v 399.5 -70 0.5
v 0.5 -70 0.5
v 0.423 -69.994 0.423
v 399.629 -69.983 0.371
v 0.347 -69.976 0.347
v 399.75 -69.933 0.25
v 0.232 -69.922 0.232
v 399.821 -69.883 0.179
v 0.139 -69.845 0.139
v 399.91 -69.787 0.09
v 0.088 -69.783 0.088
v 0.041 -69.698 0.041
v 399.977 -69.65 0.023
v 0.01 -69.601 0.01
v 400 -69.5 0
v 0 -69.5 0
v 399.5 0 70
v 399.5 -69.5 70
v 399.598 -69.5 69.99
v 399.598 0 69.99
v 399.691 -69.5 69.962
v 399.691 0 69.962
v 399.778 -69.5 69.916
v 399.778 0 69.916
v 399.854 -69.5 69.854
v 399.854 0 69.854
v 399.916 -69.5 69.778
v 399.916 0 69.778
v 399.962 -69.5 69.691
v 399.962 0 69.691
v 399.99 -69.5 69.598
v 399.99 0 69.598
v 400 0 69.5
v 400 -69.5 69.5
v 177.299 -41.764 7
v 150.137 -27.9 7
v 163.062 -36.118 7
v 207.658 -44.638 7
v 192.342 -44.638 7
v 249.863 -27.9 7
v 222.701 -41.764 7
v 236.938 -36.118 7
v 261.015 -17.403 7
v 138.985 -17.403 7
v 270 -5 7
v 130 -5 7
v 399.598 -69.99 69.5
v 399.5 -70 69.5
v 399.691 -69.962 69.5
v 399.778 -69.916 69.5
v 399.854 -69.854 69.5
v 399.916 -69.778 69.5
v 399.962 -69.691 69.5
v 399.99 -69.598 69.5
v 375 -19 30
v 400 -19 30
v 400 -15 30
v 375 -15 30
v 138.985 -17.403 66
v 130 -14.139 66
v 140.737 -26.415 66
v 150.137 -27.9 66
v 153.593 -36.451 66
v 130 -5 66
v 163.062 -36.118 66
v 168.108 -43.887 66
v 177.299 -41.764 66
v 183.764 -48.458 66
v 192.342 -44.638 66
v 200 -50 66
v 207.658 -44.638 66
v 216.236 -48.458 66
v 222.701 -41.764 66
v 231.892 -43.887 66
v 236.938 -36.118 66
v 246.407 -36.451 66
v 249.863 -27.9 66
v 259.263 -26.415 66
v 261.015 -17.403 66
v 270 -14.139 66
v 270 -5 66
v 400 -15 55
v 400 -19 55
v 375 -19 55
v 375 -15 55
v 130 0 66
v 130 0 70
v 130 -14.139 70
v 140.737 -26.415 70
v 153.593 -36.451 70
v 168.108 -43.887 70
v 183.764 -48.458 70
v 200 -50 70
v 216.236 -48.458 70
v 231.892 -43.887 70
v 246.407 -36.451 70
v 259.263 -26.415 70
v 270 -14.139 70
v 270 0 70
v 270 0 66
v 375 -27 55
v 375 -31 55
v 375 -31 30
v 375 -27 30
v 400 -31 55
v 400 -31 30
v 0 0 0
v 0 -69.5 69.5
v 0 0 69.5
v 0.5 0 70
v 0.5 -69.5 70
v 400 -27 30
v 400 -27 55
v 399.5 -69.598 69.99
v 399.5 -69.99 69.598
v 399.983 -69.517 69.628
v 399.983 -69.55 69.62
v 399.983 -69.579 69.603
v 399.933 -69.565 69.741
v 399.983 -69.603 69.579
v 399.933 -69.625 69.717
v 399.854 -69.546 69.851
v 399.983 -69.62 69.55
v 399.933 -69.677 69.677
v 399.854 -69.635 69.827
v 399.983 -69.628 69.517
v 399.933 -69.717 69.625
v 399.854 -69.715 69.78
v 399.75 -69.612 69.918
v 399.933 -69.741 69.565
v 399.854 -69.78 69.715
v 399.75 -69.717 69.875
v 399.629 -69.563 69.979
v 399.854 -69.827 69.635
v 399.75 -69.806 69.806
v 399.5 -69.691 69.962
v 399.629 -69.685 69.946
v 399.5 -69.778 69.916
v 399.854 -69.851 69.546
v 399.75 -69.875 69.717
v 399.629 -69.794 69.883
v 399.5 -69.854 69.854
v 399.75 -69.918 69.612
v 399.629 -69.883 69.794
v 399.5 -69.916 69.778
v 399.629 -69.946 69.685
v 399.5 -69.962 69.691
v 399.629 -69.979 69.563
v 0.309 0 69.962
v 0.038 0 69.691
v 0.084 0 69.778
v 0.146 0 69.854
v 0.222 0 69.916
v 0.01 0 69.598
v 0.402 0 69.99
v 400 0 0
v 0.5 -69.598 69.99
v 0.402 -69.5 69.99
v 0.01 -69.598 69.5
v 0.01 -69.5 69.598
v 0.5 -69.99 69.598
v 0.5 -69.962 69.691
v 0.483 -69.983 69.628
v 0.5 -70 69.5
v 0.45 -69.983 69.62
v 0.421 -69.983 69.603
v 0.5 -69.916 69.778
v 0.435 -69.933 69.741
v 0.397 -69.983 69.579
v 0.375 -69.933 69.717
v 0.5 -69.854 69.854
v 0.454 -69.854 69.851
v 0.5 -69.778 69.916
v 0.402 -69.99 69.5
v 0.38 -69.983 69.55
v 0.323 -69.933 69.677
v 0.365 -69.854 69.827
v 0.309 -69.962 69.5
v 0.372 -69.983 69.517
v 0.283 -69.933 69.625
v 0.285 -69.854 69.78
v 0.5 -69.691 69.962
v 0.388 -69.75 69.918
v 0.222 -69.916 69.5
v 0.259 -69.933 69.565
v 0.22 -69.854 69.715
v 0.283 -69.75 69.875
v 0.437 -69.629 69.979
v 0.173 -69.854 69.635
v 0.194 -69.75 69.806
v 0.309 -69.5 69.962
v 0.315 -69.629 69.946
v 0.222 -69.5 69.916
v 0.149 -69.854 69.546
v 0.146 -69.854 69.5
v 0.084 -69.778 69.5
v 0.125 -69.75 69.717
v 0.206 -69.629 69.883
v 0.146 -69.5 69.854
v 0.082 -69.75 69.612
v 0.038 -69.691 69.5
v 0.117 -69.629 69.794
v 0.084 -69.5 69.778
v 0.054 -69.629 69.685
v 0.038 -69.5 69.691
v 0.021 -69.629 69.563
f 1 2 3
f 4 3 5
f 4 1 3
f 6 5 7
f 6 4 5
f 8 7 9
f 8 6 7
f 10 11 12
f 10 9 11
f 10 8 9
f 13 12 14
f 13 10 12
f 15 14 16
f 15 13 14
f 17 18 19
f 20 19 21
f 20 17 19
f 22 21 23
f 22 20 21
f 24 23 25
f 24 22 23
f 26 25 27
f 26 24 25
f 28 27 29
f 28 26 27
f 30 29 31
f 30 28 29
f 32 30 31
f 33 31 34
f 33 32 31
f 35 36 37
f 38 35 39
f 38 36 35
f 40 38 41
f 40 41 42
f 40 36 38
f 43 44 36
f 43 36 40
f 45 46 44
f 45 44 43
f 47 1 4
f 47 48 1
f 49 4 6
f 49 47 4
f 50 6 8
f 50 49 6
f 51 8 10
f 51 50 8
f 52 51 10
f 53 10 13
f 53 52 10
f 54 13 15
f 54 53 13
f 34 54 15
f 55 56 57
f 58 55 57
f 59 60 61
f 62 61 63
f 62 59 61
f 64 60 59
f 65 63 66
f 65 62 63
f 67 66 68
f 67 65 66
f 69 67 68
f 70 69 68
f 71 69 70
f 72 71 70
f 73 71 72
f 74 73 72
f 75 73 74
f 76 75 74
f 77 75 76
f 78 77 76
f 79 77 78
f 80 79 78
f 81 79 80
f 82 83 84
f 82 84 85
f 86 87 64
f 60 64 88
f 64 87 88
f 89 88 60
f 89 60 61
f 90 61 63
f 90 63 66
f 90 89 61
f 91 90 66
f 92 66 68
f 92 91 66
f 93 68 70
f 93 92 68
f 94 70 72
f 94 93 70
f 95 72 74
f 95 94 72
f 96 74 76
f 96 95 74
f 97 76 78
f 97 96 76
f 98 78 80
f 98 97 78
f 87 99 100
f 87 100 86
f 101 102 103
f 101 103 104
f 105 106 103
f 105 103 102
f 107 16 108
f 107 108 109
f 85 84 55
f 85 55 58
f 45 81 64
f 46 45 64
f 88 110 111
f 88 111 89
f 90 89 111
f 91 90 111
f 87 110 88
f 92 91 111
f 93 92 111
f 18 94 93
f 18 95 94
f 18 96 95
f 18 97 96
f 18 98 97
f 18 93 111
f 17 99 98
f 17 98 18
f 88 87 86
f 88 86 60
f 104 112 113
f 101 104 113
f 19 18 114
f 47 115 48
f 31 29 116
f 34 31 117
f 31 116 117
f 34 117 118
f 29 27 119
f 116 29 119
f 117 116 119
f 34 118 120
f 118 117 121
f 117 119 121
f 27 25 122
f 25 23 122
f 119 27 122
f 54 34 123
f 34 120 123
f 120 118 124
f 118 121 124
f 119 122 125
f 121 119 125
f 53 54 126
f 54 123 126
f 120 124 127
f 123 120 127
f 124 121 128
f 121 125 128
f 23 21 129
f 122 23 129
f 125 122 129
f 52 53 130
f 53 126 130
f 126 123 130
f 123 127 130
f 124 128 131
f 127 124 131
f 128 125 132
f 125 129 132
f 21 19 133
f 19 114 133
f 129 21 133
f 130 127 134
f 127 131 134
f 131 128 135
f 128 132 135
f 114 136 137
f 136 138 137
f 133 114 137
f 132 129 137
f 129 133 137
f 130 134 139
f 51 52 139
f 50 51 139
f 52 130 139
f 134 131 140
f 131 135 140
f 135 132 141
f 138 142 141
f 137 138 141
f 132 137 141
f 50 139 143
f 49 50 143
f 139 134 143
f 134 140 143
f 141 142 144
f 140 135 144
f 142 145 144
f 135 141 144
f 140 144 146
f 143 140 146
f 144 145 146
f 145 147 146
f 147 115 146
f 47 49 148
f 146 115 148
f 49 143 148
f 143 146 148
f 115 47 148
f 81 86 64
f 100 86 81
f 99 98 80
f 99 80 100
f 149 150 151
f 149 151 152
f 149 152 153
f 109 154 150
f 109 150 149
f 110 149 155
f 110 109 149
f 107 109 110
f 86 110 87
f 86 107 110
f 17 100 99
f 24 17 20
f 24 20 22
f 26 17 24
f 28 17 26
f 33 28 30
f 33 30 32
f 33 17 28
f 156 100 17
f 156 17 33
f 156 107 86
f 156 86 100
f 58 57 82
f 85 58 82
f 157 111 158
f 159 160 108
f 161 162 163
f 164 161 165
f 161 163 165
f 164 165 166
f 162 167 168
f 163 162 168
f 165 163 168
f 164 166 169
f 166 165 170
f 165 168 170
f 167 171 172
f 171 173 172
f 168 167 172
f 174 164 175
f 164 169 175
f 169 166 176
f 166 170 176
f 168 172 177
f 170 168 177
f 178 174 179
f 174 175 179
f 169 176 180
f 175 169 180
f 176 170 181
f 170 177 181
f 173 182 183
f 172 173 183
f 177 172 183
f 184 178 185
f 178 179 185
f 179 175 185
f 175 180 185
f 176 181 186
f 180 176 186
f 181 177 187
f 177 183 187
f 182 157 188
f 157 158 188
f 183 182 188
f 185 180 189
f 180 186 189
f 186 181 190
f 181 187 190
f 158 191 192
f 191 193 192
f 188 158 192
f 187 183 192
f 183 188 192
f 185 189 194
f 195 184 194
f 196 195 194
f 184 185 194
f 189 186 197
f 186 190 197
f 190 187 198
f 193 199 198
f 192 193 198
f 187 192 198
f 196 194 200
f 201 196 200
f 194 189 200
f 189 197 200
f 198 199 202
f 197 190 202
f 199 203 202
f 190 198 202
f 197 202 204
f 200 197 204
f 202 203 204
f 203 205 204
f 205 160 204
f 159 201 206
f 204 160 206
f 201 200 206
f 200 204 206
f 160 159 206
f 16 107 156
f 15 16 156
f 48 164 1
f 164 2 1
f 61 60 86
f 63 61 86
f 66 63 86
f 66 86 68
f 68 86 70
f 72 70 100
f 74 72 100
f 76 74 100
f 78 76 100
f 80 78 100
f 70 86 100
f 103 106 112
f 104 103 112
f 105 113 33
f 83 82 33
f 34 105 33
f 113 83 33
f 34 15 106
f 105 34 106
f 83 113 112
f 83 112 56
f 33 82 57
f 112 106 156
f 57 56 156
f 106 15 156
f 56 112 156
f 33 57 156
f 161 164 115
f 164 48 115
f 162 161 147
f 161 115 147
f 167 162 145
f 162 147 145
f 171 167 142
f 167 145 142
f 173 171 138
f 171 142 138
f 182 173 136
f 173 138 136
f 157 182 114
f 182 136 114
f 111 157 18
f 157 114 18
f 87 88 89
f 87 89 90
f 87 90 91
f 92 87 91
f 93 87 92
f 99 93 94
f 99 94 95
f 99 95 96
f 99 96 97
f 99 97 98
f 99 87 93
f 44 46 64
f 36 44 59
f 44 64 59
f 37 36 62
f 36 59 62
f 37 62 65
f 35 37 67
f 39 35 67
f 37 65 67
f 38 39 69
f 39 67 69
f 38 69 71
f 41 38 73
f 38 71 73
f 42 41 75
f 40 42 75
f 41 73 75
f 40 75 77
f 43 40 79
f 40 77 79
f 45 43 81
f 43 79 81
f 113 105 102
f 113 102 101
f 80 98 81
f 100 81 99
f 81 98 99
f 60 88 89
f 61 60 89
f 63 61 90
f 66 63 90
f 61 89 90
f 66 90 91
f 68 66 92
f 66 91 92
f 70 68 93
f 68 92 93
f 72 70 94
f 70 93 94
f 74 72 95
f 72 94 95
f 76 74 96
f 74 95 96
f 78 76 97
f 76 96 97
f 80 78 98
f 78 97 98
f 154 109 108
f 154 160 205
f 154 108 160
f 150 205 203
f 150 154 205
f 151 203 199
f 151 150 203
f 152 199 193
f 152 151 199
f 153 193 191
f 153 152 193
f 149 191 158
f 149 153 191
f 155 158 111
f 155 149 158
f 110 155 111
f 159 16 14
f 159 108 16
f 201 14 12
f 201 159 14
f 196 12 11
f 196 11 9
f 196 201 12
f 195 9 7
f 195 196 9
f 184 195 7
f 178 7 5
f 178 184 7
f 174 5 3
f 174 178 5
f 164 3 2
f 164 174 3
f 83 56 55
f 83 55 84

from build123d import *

# Parameters (mm, degrees)
F0_W     = 400
F0_H     = 70
F1_DEPTH = 70
F3_DEPTH = 63
F5_DEPTH = 4
F6_W     = 4
F6_H     = 25
F7_DEPTH = 25
F9_DEPTH = 4
F10_R    = 0.5


with BuildPart() as f1:
    # F0 (on Top) → F1 (new body)
    with BuildSketch(Plane.XY):
        with Locations((200, -35)):
            Rectangle(F0_W, F0_H)
    extrude(amount=F1_DEPTH)

    # F2 (on face) → F3 (cut, through all)
    with BuildSketch(Plane.XY.offset(70)):
        with BuildLine():
            Line((270, -5), (130, -5))
            ThreePointArc((130, -5), (200, -45), (270, -5))
        make_face()
    extrude(amount=-F3_DEPTH, mode=Mode.SUBTRACT)

    # F4 (on face) → F5 (cut)
    with BuildSketch(Plane.XY.offset(70)):
        with BuildLine():
            Line((130, 0), (130, -14.1391109269))
            ThreePointArc((130, -14.1391109269), (200, -50), (270, -14.1391109269))
            Line((270, -14.1391109269), (270, 0))
            Line((270, 0), (130, 0))
        make_face()
    extrude(amount=-F5_DEPTH, mode=Mode.SUBTRACT)

    # F6 (on face) → F7 (cut)
    with BuildSketch(Plane.YZ.offset(400)):
        with Locations((-17, 42.5)):
            Rectangle(F6_W, F6_H)
        with Locations((-29, 42.5)):
            Rectangle(F6_W, F6_H)
    extrude(amount=-F7_DEPTH, mode=Mode.SUBTRACT)

    # F10
    f10_edges = [f1.edges().sort_by_distance(p)[0] for p in [
        (0, -35, 70),
        (200, -70, 70),
        (400, -35, 70),
        (0, -70, 35),
        (400, -70, 35),
        (200, -70, 0),
    ]]
    fillet(f10_edges, radius=F10_R)


with BuildPart() as f9:
    # F8 (on face) → F9 (new body)
    with BuildSketch(Plane.XY.offset(70)):
        with BuildLine():
            Line((130, 0), (130, -14.1391109269))
            ThreePointArc((130, -14.1391109269), (200, -50), (270, -14.1391109269))
            Line((270, -14.1391109269), (270, 0))
            Line((270, 0), (130, 0))
        make_face()
    extrude(amount=-F9_DEPTH)


solid = Compound([f1.part, f9.part])
